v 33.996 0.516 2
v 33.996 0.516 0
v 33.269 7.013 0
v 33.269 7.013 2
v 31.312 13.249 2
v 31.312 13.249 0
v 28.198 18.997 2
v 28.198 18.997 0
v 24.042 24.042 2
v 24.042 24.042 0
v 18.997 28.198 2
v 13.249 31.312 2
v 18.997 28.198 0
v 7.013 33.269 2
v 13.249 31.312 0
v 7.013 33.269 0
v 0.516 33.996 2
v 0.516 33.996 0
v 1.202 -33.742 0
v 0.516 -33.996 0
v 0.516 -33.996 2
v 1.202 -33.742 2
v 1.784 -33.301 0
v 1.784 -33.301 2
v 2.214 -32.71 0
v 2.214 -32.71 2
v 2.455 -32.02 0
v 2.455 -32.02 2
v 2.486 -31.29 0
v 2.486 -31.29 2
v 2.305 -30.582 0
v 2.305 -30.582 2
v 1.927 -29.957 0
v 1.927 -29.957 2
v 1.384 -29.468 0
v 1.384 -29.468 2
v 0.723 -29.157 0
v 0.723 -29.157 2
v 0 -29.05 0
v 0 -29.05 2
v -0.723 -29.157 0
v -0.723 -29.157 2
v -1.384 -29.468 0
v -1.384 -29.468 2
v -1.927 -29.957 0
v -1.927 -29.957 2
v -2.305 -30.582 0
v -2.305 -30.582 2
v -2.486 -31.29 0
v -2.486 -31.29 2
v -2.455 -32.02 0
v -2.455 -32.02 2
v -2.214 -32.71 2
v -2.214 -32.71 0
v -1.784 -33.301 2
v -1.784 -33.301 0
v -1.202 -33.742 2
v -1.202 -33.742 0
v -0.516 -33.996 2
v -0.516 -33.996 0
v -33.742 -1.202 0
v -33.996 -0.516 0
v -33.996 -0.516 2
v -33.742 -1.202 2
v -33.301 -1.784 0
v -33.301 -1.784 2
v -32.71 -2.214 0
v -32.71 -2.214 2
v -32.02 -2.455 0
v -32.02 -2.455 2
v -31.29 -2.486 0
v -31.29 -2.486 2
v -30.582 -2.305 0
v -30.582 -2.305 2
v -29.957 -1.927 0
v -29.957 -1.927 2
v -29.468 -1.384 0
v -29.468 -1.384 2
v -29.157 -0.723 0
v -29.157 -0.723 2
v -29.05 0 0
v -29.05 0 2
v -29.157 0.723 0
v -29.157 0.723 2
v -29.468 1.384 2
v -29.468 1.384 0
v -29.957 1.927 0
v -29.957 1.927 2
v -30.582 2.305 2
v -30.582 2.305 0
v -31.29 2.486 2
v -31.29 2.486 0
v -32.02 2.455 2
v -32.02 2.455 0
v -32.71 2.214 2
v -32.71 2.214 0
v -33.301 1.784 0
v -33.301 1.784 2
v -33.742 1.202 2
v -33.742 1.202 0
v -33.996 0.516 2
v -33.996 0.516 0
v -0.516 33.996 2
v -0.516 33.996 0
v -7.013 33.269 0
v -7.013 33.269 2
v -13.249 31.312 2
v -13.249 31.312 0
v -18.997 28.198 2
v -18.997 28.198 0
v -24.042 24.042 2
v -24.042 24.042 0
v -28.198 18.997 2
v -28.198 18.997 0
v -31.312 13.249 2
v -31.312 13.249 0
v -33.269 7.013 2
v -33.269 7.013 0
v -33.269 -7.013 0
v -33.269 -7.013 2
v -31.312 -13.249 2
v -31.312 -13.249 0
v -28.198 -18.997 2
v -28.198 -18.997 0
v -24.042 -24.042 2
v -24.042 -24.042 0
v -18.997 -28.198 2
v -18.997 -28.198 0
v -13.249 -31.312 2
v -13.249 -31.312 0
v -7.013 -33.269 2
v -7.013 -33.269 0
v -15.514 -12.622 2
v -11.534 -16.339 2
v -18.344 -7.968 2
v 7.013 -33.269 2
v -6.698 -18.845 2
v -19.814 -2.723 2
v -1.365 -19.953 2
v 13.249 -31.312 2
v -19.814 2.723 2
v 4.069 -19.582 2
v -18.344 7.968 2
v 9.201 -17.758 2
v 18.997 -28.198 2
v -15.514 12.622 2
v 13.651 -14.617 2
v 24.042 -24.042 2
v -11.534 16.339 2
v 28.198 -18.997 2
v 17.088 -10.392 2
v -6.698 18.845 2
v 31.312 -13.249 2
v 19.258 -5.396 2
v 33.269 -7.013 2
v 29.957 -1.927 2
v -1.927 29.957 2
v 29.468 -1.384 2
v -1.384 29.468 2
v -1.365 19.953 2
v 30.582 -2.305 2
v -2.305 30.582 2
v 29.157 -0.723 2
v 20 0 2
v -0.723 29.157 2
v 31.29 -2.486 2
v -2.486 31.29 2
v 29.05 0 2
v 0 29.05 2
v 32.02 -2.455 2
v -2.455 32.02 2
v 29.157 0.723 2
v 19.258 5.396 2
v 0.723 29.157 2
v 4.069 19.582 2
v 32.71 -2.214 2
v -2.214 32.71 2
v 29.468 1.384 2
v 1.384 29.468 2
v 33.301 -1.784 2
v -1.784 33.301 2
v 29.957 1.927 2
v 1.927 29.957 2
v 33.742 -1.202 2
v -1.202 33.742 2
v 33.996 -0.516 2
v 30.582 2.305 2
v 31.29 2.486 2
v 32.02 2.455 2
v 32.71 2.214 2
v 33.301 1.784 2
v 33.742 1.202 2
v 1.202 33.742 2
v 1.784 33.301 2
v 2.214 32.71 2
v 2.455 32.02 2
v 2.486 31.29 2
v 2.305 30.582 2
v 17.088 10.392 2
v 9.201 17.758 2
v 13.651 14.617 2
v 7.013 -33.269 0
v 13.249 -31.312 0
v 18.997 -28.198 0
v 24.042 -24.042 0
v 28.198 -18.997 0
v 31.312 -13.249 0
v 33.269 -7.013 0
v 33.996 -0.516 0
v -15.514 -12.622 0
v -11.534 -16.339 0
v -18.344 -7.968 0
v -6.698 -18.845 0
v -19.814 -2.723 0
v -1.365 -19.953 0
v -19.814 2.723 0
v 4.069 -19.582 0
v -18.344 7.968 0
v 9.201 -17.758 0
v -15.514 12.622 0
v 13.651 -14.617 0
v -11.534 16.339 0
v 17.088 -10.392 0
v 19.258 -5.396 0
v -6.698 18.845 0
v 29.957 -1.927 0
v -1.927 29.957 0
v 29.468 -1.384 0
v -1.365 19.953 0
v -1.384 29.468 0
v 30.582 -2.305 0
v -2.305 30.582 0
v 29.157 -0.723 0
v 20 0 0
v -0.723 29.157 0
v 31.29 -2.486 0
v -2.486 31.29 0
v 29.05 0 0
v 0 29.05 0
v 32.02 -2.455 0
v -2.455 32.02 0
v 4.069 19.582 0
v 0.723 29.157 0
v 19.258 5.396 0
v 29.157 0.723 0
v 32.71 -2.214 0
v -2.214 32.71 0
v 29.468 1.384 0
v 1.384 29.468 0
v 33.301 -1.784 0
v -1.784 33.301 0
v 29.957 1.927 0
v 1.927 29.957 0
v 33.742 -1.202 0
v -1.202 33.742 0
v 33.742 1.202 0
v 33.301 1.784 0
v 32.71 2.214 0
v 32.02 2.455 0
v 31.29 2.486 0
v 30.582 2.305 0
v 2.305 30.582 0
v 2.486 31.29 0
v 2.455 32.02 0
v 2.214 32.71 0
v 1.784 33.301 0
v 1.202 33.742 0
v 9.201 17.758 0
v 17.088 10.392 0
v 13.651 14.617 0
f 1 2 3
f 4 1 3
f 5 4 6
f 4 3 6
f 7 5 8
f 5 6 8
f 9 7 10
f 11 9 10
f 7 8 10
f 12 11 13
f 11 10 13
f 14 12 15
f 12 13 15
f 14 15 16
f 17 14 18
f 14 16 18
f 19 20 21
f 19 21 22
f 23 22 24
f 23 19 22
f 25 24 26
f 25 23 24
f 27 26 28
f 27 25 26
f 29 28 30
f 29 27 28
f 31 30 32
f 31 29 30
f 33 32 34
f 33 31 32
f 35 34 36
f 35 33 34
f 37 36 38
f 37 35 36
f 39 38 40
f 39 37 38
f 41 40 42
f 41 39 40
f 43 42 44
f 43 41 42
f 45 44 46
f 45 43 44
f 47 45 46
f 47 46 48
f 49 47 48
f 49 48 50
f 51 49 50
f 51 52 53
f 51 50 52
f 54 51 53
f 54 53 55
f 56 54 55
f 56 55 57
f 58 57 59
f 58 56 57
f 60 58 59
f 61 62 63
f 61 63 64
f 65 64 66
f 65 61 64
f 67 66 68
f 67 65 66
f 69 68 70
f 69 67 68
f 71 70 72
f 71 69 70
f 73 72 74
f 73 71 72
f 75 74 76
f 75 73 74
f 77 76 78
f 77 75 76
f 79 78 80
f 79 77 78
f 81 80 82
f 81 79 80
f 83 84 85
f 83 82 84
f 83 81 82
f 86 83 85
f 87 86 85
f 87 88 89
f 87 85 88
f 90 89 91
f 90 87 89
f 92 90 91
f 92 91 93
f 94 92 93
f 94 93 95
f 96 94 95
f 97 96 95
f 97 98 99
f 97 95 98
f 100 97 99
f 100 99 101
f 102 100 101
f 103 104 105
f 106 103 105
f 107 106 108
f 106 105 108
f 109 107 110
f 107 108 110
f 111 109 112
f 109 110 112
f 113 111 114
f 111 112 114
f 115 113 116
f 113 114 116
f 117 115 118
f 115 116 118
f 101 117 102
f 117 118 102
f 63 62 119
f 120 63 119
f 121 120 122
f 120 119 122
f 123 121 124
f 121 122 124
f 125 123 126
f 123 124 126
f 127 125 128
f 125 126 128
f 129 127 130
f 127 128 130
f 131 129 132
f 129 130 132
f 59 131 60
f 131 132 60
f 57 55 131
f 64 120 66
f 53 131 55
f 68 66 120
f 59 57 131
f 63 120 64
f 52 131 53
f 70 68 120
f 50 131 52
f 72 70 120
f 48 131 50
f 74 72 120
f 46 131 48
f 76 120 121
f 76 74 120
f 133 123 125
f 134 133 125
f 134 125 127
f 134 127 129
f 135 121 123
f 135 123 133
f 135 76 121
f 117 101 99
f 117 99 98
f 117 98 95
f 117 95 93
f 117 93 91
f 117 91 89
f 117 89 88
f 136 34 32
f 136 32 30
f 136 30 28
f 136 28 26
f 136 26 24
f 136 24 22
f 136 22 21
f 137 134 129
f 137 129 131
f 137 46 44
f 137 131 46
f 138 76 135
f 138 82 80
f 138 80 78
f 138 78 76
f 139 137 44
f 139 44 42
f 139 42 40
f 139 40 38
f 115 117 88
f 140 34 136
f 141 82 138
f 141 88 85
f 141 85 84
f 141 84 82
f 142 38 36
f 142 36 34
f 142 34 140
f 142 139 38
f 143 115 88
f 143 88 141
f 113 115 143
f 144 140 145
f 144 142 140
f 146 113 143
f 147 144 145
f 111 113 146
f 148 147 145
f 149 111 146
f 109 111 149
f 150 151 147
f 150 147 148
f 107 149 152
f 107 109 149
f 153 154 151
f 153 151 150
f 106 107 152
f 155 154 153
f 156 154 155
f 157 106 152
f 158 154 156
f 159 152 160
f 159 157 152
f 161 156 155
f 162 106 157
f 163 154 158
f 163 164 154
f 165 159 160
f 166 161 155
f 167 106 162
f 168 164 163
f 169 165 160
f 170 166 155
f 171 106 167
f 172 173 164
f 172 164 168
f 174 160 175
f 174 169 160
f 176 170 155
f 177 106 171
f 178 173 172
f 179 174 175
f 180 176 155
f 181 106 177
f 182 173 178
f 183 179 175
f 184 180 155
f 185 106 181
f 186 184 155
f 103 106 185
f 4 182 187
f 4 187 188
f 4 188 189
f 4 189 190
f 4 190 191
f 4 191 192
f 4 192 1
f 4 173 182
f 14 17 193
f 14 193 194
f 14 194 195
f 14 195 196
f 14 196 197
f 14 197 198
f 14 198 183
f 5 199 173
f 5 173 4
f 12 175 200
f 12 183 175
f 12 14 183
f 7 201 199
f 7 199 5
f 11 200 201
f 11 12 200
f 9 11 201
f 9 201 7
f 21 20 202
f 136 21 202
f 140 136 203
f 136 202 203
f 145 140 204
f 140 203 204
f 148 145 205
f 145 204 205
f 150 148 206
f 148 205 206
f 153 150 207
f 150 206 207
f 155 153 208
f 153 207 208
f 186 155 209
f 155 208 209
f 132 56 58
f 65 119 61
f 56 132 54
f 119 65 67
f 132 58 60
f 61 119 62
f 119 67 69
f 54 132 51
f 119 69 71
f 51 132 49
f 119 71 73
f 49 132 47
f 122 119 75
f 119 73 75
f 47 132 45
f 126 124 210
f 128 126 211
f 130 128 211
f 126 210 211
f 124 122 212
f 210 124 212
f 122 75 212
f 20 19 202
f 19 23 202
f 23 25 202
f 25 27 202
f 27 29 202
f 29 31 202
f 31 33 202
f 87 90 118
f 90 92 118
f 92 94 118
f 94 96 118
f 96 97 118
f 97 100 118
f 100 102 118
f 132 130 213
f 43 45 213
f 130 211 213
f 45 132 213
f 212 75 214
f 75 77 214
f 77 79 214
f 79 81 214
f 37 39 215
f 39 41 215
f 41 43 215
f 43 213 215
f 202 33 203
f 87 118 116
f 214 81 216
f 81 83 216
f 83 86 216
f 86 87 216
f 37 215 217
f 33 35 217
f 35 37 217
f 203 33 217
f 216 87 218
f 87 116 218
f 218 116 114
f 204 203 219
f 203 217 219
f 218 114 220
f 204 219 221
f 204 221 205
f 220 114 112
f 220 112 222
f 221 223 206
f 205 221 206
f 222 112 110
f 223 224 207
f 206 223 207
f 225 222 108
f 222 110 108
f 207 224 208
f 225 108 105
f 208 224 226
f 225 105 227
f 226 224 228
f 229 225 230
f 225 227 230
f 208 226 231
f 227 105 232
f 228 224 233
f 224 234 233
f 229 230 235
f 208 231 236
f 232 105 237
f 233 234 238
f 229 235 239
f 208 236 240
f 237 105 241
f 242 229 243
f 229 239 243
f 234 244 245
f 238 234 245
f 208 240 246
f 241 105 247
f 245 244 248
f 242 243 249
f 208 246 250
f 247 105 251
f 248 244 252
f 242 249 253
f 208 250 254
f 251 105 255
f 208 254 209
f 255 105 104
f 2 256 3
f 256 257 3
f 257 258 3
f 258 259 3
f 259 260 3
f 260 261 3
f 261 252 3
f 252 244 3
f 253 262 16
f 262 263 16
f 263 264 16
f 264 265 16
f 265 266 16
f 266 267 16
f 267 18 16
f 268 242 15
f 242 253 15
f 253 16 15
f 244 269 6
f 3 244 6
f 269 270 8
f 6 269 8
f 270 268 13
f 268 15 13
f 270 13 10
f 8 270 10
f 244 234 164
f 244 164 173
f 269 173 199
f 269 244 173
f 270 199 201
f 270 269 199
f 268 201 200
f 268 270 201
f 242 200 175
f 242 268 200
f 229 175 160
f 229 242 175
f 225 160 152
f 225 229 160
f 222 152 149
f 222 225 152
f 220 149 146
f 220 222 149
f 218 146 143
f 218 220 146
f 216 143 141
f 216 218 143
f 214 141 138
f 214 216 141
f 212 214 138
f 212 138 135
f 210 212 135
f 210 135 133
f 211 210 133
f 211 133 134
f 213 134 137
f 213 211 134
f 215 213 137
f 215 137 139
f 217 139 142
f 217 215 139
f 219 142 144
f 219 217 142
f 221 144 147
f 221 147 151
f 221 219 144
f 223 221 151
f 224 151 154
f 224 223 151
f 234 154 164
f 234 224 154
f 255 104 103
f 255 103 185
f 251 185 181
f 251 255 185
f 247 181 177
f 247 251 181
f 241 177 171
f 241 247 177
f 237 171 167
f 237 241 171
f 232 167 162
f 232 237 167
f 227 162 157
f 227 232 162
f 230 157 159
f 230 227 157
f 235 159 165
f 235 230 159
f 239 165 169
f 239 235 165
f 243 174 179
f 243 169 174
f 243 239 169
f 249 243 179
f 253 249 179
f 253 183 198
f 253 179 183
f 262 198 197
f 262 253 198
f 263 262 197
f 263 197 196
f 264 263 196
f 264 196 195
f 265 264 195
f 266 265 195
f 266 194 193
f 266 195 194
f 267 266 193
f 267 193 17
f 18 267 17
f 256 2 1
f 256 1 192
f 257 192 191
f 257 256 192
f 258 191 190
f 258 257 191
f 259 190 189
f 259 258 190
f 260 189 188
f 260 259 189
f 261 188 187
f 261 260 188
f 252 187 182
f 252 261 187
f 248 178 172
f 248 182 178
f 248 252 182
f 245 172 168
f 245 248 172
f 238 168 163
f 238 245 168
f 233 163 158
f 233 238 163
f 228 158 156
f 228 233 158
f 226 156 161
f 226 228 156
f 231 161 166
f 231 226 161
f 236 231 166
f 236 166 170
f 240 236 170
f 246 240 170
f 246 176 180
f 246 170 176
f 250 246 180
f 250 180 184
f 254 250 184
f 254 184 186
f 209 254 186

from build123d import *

# Parameters (mm, degrees)
CYLINDER_R     = 2.5
CYLINDER_DEPTH = 10
ARRAY_COUNT    = 4
TUBE_R         = 34
TUBE_R_2       = 20
TUBE_DEPTH     = 2


with BuildPart() as array:
    # Cylinder → Cylinder (new body)
    with BuildSketch(Plane(origin=(31.55, 0, 0), x_dir=(1, 0, 0), z_dir=(0, 0, 1))):
        Circle(CYLINDER_R)
    extrude(amount=CYLINDER_DEPTH)

    # Array: Array ×4 about axis
    array_axis = Axis((0, 0, 0), (0, 0, 1))


with BuildPart() as array_1:
    add(array.part)
    for i in range(1, ARRAY_COUNT):
        add(array.part.rotate(array_axis, i * 360 / ARRAY_COUNT))


with BuildPart() as cut:
    # Tube → Tube (new body)
    with BuildSketch(Plane.XY):
        Circle(TUBE_R)
        Circle(TUBE_R_2, mode=Mode.SUBTRACT)
    extrude(amount=TUBE_DEPTH)

    # Cut: cut Array
    add(array_1.part, mode=Mode.SUBTRACT)


solid = cut.part
